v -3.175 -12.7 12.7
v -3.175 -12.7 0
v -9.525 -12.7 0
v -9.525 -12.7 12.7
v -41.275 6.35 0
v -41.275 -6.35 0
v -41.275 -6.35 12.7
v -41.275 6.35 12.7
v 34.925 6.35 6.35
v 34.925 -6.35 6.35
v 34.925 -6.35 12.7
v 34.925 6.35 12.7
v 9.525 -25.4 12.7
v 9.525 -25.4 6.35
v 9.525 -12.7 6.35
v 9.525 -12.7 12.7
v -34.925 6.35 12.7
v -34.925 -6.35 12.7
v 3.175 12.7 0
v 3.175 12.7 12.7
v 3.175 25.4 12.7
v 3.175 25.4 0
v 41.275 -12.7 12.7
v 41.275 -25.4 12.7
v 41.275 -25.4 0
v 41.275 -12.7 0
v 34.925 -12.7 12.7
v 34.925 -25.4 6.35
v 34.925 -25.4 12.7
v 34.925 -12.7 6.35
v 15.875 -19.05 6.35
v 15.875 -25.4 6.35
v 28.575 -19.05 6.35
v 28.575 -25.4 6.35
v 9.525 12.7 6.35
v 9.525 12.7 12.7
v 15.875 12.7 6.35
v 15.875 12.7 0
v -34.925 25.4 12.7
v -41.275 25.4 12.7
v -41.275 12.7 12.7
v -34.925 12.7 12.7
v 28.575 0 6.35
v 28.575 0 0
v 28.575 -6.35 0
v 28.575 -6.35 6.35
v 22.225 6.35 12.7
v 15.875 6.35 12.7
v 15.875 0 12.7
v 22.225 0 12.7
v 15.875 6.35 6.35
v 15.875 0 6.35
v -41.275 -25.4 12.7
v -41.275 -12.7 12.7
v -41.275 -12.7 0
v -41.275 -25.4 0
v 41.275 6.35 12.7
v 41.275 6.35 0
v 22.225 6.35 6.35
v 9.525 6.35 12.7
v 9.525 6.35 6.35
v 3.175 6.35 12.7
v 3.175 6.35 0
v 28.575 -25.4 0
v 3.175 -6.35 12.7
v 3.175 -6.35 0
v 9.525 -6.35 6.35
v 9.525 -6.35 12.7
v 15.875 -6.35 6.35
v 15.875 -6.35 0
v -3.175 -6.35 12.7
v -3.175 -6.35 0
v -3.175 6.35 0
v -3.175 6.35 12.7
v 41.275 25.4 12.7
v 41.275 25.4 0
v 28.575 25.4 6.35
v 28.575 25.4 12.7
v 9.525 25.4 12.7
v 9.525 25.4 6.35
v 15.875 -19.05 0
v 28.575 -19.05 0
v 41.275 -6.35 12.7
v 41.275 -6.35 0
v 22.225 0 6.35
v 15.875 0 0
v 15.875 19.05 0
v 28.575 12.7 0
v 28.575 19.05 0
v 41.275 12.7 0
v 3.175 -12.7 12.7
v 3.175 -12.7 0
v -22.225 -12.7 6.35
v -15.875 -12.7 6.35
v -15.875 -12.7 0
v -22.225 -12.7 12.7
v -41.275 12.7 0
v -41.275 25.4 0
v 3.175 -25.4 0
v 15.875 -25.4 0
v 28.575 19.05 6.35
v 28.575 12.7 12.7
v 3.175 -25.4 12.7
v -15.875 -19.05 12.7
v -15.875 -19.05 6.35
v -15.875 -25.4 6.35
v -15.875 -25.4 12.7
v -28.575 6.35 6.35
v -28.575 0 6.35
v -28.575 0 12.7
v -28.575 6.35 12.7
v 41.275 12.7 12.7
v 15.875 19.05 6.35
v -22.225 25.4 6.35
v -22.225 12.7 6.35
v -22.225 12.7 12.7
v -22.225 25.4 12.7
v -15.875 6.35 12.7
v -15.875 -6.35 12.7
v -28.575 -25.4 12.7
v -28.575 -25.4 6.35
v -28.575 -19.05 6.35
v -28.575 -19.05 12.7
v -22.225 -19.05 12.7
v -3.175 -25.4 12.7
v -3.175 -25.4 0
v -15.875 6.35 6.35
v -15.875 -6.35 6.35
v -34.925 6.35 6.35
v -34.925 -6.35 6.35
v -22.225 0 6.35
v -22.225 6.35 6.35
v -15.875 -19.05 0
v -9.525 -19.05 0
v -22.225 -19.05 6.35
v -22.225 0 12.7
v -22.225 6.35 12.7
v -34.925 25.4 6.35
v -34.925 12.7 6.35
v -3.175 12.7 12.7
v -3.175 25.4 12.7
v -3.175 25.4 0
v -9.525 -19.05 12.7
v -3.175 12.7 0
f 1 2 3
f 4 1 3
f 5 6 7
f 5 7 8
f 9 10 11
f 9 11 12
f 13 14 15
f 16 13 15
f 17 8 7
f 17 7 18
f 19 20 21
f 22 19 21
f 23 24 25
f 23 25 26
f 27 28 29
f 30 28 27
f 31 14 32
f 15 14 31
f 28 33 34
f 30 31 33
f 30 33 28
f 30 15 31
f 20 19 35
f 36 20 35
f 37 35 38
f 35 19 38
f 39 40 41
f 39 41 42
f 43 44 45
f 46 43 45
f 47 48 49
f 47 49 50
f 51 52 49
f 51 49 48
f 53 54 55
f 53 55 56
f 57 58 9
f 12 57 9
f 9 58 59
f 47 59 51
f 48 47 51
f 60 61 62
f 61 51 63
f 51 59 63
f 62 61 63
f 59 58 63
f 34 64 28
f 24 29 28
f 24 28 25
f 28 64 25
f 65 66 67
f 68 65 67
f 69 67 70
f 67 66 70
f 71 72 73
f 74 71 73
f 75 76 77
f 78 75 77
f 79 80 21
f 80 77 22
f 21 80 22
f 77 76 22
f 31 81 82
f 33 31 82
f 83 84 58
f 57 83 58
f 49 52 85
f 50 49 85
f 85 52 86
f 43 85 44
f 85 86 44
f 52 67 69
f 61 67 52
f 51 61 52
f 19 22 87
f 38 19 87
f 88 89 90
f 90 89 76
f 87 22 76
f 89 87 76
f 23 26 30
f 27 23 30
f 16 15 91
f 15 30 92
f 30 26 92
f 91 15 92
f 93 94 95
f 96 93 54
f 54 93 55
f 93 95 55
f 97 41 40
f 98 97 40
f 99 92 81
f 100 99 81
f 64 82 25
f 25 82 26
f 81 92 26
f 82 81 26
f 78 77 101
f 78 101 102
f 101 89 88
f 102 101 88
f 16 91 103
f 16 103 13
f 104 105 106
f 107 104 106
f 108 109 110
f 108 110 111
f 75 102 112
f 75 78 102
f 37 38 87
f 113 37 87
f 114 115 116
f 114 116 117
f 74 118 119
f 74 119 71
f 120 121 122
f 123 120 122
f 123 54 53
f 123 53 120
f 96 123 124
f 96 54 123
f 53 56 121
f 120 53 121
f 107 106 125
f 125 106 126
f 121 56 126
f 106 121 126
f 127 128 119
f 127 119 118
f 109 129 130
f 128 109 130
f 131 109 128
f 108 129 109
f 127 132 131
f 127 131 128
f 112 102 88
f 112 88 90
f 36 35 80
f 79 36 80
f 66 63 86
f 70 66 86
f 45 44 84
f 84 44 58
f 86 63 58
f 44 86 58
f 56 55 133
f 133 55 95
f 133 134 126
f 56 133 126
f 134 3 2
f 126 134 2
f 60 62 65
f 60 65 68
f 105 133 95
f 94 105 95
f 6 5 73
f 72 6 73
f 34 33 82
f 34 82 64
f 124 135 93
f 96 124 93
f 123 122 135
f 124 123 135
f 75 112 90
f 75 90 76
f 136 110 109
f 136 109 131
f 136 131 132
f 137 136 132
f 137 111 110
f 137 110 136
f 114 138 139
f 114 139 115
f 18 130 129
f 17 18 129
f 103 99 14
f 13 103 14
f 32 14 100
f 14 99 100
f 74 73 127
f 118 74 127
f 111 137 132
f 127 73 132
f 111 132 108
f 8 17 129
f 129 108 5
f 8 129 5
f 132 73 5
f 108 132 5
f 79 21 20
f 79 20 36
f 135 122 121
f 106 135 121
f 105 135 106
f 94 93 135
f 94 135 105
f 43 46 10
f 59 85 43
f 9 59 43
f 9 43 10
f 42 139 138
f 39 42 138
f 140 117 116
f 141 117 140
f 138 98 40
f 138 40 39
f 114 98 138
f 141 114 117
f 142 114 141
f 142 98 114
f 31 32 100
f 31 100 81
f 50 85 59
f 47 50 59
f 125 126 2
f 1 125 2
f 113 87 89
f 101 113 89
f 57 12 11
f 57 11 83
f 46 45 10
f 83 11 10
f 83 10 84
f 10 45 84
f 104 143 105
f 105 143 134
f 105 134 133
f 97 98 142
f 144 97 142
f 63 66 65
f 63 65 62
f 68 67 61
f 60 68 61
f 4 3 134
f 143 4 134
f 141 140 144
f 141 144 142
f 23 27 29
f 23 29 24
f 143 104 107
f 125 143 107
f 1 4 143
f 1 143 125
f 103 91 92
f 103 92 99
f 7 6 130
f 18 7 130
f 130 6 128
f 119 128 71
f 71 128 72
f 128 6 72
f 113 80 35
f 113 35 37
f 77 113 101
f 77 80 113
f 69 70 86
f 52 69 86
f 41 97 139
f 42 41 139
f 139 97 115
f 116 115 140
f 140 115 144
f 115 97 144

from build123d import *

# Parameters (mm, degrees)
F0_W     = 6.35
F0_H     = 12.7
F1_DEPTH = 12.7
F0_W_2   = 19.05
F0_W_3   = 12.7
F0_W_4   = 6.3499998555
F0_H_2   = 6.35
F2_DEPTH = 6.35


with BuildPart() as f1:
    # F0 (on Top) → F1 (new body)
    with BuildSketch(Plane.XY):
        with Locations((-38.1, 19.05)):
            Rectangle(F0_W, F0_H)
    extrude(amount=F1_DEPTH)



with BuildPart() as f1b:
    # F0 (on Top) → F1, piece 2 (new body)
    with BuildSketch(Plane.XY):
        with Locations((-12.7, 19.05)):
            Rectangle(F0_W_2, F0_H)
    extrude(amount=F1_DEPTH)


with BuildPart() as f1c:
    # F0 (on Top) → F1, piece 3 (new body)
    with BuildSketch(Plane.XY):
        with Locations((-38.1, 0)):
            Rectangle(F0_W, F0_H)
    extrude(amount=F1_DEPTH)



with BuildPart() as f1d:
    # F0 (on Top) → F1, piece 4 (new body)
    with BuildSketch(Plane.XY):
        with Locations((-9.525, 0)):
            Rectangle(F0_W_3, F0_H)
    extrude(amount=F1_DEPTH)


with BuildPart() as f1e:
    # F0 (on Top) → F1, piece 5 (new body)
    with BuildSketch(Plane.XY):
        with Locations((-25.3999999277, 3.175)):
            Rectangle(F0_W_4, F0_H_2)
    extrude(amount=F1_DEPTH)


with BuildPart() as f1f:
    # F0 (on Top) → F1, piece 6 (new body)
    with BuildSketch(Plane.XY):
        Polygon((-41.275, -12.7), (-41.275, -25.4), (-28.5749994218, -25.4), (-28.5749994218, -19.05), (-22.225, -19.05), (-22.225, -12.7), align=None)
    extrude(amount=F1_DEPTH)



with BuildPart() as f1g:
    # F0 (on Top) → F1, piece 7 (new body)
    with BuildSketch(Plane.XY):
        Polygon((-15.875, -19.05), (-15.875, -25.4), (-3.175, -25.4), (-3.175, -12.7), (-9.525, -12.7), (-9.525, -19.05), align=None)
    extrude(amount=F1_DEPTH)


with BuildPart() as f1h:
    # F0 (on Top) → F1, piece 8 (new body)
    with BuildSketch(Plane.XY):
        Polygon((28.575, 12.7), (41.275, 12.7), (41.275, 25.4), (28.575, 25.4), (28.575, 19.05), align=None)
    extrude(amount=F1_DEPTH)



with BuildPart() as f1i:
    # F0 (on Top) → F1, piece 9 (new body)
    with BuildSketch(Plane.XY):
        with Locations((6.35, 19.05)):
            Rectangle(F0_W, F0_H)
    extrude(amount=F1_DEPTH)


with BuildPart() as f1j:
    # F0 (on Top) → F1, piece 10 (new body)
    with BuildSketch(Plane.XY):
        with Locations((6.35, 0)):
            Rectangle(F0_W, F0_H)
    extrude(amount=F1_DEPTH)



with BuildPart() as f1k:
    # F0 (on Top) → F1, piece 11 (new body)
    with BuildSketch(Plane.XY):
        with Locations((19.05, 3.175)):
            Rectangle(F0_W, F0_H_2)
    extrude(amount=F1_DEPTH)


with BuildPart() as f1l:
    # F0 (on Top) → F1, piece 12 (new body)
    with BuildSketch(Plane.XY):
        with Locations((38.1, 0)):
            Rectangle(F0_W, F0_H)
    extrude(amount=F1_DEPTH)


with BuildPart() as f1m:
    # F0 (on Top) → F1, piece 13 (new body)
    with BuildSketch(Plane.XY):
        with Locations((38.1, -19.05)):
            Rectangle(F0_W, F0_H)
    extrude(amount=F1_DEPTH)



with BuildPart() as f1n:
    # F0 (on Top) → F1, piece 14 (new body)
    with BuildSketch(Plane.XY):
        Polygon((9.525, -19.05), (9.525, -12.7), (3.175, -12.7), (3.175, -25.4), (9.525, -25.4), align=None)
    extrude(amount=F1_DEPTH)


with BuildPart() as f1m_1:
    add(f1m.part)

    add(f1n.part)  # F2 merges F1n
    # F0 (on Top) → F2 (join)
    with BuildSketch(Plane.XY):
        Polygon((28.575, -25.4), (34.925, -25.4), (34.925, -12.7), (9.525, -12.7), (9.525, -19.05), (9.525, -25.4), (15.875, -25.4), (15.875, -19.05), (28.575, -19.05), align=None)
    extrude(amount=F2_DEPTH)


with BuildPart() as f1f_1:
    add(f1f.part)

    add(f1g.part)  # F2#2 merges F1g
    # F0 (on Top) → F2, piece 2 (join)
    with BuildSketch(Plane.XY):
        Polygon((-28.5749994218, -19.05), (-28.5749994218, -25.4), (-15.875, -25.4), (-15.875, -19.05), (-15.875, -12.7), (-22.225, -12.7), (-22.225, -19.05), align=None)
    extrude(amount=F2_DEPTH)


with BuildPart() as f1_1:
    add(f1.part)

    add(f1b.part)  # F2#3 merges F1b
    # F0 (on Top) → F2, piece 3 (join)
    with BuildSketch(Plane.XY):
        with Locations((-28.575, 19.05)):
            Rectangle(F0_W_3, F0_H)
    extrude(amount=F2_DEPTH)


with BuildPart() as f1j_1:
    add(f1j.part)

    add(f1k.part)  # F2#4 merges F1k

    add(f1l.part)  # F2#4 merges F1l
    # F0 (on Top) → F2, piece 4 (join)
    with BuildSketch(Plane.XY):
        Polygon((15.875, 6.35), (9.525, 6.35), (9.525, -6.35), (15.875, -6.35), (15.875, 0), align=None)
        Polygon((34.925, 6.35), (22.225, 6.35), (22.225, 0), (28.575, 0), (28.575, -6.35), (34.925, -6.35), align=None)
    extrude(amount=F2_DEPTH)


with BuildPart() as f1h_1:
    add(f1h.part)

    add(f1i.part)  # F2#5 merges F1i
    # F0 (on Top) → F2, piece 5 (join)
    with BuildSketch(Plane.XY):
        Polygon((15.875, 19.05), (28.575, 19.05), (28.575, 25.4), (9.525, 25.4), (9.525, 12.7), (15.875, 12.7), align=None)
    extrude(amount=F2_DEPTH)


with BuildPart() as f1c_1:
    add(f1c.part)

    add(f1d.part)  # F2#6 merges F1d

    add(f1e.part)  # F2#6 merges F1e
    # F0 (on Top) → F2, piece 6 (join)
    with BuildSketch(Plane.XY):
        Polygon((-34.925, 6.35), (-34.925, -6.35), (-15.875, -6.35), (-15.875, 6.35), (-22.225, 6.35), (-22.225, 0), (-28.5749997109, 0), (-28.5749998555, 6.35), align=None)
    extrude(amount=F2_DEPTH)


solid = Compound([f1m_1.part, f1f_1.part, f1_1.part, f1j_1.part, f1h_1.part, f1c_1.part])
